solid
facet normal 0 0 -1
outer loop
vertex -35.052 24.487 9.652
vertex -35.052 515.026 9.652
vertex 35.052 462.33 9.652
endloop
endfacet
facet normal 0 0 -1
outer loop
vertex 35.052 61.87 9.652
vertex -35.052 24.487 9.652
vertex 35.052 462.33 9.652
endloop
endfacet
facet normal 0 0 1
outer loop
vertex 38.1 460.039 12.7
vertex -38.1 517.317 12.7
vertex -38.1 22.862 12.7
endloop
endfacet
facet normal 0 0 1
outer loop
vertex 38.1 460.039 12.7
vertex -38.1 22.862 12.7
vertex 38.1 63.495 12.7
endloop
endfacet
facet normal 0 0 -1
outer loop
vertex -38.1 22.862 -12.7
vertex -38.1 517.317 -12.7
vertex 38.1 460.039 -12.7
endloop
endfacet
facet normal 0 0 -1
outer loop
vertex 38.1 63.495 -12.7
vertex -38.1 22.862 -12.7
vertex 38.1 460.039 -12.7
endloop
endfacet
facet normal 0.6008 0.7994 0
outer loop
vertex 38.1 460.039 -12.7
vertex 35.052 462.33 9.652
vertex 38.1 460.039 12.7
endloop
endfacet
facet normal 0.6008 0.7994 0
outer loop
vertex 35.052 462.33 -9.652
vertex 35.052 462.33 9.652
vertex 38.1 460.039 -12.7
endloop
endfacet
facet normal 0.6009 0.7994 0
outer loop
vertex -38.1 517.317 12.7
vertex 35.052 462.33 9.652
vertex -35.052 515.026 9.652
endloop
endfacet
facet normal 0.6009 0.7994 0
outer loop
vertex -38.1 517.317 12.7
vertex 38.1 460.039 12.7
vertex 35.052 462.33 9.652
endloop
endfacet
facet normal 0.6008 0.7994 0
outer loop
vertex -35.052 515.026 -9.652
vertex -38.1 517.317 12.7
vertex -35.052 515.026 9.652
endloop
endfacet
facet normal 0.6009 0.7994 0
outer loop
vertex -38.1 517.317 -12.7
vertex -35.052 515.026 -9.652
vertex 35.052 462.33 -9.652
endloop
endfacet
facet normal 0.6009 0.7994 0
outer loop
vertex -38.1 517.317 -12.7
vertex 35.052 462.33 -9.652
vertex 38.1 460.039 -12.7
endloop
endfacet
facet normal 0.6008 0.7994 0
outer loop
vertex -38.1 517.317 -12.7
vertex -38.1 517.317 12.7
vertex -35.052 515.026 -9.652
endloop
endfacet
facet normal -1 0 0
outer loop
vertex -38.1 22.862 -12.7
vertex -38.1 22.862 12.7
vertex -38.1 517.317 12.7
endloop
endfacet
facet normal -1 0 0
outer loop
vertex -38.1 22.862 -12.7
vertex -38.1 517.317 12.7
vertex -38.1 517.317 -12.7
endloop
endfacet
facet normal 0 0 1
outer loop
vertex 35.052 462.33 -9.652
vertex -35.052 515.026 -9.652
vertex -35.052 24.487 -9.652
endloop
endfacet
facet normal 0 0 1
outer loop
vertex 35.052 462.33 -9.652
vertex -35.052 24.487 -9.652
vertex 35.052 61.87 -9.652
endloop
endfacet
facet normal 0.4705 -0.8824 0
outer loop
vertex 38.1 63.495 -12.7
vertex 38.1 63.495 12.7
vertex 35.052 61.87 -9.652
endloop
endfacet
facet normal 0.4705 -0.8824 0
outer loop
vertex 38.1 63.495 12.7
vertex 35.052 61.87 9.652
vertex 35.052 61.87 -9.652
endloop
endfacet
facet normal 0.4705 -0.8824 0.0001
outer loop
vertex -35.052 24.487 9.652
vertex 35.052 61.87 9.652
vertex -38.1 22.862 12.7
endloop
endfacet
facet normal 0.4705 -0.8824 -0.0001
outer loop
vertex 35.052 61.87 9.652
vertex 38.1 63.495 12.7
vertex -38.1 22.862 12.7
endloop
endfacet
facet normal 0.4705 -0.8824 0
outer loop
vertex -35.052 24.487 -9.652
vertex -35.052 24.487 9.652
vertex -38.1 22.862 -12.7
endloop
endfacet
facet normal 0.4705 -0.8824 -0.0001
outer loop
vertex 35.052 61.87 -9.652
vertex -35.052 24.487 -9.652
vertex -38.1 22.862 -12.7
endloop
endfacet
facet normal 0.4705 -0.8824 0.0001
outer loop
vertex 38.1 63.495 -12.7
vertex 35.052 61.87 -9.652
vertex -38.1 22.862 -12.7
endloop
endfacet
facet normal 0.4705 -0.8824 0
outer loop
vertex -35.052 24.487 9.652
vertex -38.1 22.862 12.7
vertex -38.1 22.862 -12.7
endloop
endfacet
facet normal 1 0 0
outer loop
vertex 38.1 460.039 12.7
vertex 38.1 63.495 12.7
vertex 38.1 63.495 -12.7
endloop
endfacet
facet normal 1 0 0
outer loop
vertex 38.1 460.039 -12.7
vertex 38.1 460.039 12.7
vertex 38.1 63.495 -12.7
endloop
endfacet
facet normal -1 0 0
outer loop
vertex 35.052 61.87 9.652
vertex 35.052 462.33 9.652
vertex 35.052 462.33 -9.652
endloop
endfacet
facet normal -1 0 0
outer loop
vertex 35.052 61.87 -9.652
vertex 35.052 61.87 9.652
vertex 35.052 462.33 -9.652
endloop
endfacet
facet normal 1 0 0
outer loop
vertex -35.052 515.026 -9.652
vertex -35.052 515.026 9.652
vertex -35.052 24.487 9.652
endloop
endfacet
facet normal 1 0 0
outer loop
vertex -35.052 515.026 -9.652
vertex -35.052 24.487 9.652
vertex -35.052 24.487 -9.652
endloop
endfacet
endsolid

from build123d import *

# Parameters (mm, degrees)
SKETCH1_W           = 76.2
SKETCH1_H           = 25.4
SKETCH1_W_2         = 70.104
SKETCH1_H_2         = 19.304
BOSS_EXTRUDE1_DEPTH = 536.341159
CUT_EXTRUDE1_START  = -30.455423
SKETCH3_W           = 25.4
SKETCH3_H           = 76.2
CUT_EXTRUDE1_DEPTH  = 106.757864
CUT_EXTRUDE2_START  = -33.61888
SKETCH4_W           = 25.4
SKETCH4_H           = 76.2
CUT_EXTRUDE2_DEPTH  = 97.113932


with BuildPart() as part:
    # Sketch1 → Boss-Extrude1 (new body)
    with BuildSketch(Plane(origin=(0, 0, 0), x_dir=(1, 0, 0), z_dir=(0, 1, 0))):
        Rectangle(SKETCH1_W, SKETCH1_H)
        Rectangle(SKETCH1_W_2, SKETCH1_H_2, mode=Mode.SUBTRACT)
    extrude(amount=BOSS_EXTRUDE1_DEPTH)

    # Sketch3 → Cut-Extrude1 (cut)
    with BuildSketch(Plane(origin=(0, 536.341159245, 0), x_dir=(0, 0, -1), z_dir=(0.799354935, -0.600859125, 0)).offset(CUT_EXTRUDE1_START)):
        Rectangle(SKETCH3_W, SKETCH3_H)
    extrude(amount=CUT_EXTRUDE1_DEPTH, mode=Mode.SUBTRACT)

    # Sketch4 → Cut-Extrude2 (cut)
    with BuildSketch(Plane(origin=(0, 0, 0), x_dir=(0, 0, -1), z_dir=(0.882385297, 0.470527564, 0)).offset(CUT_EXTRUDE2_START)):
        Rectangle(SKETCH4_W, SKETCH4_H)
    extrude(amount=CUT_EXTRUDE2_DEPTH, mode=Mode.SUBTRACT)


solid = part.part
